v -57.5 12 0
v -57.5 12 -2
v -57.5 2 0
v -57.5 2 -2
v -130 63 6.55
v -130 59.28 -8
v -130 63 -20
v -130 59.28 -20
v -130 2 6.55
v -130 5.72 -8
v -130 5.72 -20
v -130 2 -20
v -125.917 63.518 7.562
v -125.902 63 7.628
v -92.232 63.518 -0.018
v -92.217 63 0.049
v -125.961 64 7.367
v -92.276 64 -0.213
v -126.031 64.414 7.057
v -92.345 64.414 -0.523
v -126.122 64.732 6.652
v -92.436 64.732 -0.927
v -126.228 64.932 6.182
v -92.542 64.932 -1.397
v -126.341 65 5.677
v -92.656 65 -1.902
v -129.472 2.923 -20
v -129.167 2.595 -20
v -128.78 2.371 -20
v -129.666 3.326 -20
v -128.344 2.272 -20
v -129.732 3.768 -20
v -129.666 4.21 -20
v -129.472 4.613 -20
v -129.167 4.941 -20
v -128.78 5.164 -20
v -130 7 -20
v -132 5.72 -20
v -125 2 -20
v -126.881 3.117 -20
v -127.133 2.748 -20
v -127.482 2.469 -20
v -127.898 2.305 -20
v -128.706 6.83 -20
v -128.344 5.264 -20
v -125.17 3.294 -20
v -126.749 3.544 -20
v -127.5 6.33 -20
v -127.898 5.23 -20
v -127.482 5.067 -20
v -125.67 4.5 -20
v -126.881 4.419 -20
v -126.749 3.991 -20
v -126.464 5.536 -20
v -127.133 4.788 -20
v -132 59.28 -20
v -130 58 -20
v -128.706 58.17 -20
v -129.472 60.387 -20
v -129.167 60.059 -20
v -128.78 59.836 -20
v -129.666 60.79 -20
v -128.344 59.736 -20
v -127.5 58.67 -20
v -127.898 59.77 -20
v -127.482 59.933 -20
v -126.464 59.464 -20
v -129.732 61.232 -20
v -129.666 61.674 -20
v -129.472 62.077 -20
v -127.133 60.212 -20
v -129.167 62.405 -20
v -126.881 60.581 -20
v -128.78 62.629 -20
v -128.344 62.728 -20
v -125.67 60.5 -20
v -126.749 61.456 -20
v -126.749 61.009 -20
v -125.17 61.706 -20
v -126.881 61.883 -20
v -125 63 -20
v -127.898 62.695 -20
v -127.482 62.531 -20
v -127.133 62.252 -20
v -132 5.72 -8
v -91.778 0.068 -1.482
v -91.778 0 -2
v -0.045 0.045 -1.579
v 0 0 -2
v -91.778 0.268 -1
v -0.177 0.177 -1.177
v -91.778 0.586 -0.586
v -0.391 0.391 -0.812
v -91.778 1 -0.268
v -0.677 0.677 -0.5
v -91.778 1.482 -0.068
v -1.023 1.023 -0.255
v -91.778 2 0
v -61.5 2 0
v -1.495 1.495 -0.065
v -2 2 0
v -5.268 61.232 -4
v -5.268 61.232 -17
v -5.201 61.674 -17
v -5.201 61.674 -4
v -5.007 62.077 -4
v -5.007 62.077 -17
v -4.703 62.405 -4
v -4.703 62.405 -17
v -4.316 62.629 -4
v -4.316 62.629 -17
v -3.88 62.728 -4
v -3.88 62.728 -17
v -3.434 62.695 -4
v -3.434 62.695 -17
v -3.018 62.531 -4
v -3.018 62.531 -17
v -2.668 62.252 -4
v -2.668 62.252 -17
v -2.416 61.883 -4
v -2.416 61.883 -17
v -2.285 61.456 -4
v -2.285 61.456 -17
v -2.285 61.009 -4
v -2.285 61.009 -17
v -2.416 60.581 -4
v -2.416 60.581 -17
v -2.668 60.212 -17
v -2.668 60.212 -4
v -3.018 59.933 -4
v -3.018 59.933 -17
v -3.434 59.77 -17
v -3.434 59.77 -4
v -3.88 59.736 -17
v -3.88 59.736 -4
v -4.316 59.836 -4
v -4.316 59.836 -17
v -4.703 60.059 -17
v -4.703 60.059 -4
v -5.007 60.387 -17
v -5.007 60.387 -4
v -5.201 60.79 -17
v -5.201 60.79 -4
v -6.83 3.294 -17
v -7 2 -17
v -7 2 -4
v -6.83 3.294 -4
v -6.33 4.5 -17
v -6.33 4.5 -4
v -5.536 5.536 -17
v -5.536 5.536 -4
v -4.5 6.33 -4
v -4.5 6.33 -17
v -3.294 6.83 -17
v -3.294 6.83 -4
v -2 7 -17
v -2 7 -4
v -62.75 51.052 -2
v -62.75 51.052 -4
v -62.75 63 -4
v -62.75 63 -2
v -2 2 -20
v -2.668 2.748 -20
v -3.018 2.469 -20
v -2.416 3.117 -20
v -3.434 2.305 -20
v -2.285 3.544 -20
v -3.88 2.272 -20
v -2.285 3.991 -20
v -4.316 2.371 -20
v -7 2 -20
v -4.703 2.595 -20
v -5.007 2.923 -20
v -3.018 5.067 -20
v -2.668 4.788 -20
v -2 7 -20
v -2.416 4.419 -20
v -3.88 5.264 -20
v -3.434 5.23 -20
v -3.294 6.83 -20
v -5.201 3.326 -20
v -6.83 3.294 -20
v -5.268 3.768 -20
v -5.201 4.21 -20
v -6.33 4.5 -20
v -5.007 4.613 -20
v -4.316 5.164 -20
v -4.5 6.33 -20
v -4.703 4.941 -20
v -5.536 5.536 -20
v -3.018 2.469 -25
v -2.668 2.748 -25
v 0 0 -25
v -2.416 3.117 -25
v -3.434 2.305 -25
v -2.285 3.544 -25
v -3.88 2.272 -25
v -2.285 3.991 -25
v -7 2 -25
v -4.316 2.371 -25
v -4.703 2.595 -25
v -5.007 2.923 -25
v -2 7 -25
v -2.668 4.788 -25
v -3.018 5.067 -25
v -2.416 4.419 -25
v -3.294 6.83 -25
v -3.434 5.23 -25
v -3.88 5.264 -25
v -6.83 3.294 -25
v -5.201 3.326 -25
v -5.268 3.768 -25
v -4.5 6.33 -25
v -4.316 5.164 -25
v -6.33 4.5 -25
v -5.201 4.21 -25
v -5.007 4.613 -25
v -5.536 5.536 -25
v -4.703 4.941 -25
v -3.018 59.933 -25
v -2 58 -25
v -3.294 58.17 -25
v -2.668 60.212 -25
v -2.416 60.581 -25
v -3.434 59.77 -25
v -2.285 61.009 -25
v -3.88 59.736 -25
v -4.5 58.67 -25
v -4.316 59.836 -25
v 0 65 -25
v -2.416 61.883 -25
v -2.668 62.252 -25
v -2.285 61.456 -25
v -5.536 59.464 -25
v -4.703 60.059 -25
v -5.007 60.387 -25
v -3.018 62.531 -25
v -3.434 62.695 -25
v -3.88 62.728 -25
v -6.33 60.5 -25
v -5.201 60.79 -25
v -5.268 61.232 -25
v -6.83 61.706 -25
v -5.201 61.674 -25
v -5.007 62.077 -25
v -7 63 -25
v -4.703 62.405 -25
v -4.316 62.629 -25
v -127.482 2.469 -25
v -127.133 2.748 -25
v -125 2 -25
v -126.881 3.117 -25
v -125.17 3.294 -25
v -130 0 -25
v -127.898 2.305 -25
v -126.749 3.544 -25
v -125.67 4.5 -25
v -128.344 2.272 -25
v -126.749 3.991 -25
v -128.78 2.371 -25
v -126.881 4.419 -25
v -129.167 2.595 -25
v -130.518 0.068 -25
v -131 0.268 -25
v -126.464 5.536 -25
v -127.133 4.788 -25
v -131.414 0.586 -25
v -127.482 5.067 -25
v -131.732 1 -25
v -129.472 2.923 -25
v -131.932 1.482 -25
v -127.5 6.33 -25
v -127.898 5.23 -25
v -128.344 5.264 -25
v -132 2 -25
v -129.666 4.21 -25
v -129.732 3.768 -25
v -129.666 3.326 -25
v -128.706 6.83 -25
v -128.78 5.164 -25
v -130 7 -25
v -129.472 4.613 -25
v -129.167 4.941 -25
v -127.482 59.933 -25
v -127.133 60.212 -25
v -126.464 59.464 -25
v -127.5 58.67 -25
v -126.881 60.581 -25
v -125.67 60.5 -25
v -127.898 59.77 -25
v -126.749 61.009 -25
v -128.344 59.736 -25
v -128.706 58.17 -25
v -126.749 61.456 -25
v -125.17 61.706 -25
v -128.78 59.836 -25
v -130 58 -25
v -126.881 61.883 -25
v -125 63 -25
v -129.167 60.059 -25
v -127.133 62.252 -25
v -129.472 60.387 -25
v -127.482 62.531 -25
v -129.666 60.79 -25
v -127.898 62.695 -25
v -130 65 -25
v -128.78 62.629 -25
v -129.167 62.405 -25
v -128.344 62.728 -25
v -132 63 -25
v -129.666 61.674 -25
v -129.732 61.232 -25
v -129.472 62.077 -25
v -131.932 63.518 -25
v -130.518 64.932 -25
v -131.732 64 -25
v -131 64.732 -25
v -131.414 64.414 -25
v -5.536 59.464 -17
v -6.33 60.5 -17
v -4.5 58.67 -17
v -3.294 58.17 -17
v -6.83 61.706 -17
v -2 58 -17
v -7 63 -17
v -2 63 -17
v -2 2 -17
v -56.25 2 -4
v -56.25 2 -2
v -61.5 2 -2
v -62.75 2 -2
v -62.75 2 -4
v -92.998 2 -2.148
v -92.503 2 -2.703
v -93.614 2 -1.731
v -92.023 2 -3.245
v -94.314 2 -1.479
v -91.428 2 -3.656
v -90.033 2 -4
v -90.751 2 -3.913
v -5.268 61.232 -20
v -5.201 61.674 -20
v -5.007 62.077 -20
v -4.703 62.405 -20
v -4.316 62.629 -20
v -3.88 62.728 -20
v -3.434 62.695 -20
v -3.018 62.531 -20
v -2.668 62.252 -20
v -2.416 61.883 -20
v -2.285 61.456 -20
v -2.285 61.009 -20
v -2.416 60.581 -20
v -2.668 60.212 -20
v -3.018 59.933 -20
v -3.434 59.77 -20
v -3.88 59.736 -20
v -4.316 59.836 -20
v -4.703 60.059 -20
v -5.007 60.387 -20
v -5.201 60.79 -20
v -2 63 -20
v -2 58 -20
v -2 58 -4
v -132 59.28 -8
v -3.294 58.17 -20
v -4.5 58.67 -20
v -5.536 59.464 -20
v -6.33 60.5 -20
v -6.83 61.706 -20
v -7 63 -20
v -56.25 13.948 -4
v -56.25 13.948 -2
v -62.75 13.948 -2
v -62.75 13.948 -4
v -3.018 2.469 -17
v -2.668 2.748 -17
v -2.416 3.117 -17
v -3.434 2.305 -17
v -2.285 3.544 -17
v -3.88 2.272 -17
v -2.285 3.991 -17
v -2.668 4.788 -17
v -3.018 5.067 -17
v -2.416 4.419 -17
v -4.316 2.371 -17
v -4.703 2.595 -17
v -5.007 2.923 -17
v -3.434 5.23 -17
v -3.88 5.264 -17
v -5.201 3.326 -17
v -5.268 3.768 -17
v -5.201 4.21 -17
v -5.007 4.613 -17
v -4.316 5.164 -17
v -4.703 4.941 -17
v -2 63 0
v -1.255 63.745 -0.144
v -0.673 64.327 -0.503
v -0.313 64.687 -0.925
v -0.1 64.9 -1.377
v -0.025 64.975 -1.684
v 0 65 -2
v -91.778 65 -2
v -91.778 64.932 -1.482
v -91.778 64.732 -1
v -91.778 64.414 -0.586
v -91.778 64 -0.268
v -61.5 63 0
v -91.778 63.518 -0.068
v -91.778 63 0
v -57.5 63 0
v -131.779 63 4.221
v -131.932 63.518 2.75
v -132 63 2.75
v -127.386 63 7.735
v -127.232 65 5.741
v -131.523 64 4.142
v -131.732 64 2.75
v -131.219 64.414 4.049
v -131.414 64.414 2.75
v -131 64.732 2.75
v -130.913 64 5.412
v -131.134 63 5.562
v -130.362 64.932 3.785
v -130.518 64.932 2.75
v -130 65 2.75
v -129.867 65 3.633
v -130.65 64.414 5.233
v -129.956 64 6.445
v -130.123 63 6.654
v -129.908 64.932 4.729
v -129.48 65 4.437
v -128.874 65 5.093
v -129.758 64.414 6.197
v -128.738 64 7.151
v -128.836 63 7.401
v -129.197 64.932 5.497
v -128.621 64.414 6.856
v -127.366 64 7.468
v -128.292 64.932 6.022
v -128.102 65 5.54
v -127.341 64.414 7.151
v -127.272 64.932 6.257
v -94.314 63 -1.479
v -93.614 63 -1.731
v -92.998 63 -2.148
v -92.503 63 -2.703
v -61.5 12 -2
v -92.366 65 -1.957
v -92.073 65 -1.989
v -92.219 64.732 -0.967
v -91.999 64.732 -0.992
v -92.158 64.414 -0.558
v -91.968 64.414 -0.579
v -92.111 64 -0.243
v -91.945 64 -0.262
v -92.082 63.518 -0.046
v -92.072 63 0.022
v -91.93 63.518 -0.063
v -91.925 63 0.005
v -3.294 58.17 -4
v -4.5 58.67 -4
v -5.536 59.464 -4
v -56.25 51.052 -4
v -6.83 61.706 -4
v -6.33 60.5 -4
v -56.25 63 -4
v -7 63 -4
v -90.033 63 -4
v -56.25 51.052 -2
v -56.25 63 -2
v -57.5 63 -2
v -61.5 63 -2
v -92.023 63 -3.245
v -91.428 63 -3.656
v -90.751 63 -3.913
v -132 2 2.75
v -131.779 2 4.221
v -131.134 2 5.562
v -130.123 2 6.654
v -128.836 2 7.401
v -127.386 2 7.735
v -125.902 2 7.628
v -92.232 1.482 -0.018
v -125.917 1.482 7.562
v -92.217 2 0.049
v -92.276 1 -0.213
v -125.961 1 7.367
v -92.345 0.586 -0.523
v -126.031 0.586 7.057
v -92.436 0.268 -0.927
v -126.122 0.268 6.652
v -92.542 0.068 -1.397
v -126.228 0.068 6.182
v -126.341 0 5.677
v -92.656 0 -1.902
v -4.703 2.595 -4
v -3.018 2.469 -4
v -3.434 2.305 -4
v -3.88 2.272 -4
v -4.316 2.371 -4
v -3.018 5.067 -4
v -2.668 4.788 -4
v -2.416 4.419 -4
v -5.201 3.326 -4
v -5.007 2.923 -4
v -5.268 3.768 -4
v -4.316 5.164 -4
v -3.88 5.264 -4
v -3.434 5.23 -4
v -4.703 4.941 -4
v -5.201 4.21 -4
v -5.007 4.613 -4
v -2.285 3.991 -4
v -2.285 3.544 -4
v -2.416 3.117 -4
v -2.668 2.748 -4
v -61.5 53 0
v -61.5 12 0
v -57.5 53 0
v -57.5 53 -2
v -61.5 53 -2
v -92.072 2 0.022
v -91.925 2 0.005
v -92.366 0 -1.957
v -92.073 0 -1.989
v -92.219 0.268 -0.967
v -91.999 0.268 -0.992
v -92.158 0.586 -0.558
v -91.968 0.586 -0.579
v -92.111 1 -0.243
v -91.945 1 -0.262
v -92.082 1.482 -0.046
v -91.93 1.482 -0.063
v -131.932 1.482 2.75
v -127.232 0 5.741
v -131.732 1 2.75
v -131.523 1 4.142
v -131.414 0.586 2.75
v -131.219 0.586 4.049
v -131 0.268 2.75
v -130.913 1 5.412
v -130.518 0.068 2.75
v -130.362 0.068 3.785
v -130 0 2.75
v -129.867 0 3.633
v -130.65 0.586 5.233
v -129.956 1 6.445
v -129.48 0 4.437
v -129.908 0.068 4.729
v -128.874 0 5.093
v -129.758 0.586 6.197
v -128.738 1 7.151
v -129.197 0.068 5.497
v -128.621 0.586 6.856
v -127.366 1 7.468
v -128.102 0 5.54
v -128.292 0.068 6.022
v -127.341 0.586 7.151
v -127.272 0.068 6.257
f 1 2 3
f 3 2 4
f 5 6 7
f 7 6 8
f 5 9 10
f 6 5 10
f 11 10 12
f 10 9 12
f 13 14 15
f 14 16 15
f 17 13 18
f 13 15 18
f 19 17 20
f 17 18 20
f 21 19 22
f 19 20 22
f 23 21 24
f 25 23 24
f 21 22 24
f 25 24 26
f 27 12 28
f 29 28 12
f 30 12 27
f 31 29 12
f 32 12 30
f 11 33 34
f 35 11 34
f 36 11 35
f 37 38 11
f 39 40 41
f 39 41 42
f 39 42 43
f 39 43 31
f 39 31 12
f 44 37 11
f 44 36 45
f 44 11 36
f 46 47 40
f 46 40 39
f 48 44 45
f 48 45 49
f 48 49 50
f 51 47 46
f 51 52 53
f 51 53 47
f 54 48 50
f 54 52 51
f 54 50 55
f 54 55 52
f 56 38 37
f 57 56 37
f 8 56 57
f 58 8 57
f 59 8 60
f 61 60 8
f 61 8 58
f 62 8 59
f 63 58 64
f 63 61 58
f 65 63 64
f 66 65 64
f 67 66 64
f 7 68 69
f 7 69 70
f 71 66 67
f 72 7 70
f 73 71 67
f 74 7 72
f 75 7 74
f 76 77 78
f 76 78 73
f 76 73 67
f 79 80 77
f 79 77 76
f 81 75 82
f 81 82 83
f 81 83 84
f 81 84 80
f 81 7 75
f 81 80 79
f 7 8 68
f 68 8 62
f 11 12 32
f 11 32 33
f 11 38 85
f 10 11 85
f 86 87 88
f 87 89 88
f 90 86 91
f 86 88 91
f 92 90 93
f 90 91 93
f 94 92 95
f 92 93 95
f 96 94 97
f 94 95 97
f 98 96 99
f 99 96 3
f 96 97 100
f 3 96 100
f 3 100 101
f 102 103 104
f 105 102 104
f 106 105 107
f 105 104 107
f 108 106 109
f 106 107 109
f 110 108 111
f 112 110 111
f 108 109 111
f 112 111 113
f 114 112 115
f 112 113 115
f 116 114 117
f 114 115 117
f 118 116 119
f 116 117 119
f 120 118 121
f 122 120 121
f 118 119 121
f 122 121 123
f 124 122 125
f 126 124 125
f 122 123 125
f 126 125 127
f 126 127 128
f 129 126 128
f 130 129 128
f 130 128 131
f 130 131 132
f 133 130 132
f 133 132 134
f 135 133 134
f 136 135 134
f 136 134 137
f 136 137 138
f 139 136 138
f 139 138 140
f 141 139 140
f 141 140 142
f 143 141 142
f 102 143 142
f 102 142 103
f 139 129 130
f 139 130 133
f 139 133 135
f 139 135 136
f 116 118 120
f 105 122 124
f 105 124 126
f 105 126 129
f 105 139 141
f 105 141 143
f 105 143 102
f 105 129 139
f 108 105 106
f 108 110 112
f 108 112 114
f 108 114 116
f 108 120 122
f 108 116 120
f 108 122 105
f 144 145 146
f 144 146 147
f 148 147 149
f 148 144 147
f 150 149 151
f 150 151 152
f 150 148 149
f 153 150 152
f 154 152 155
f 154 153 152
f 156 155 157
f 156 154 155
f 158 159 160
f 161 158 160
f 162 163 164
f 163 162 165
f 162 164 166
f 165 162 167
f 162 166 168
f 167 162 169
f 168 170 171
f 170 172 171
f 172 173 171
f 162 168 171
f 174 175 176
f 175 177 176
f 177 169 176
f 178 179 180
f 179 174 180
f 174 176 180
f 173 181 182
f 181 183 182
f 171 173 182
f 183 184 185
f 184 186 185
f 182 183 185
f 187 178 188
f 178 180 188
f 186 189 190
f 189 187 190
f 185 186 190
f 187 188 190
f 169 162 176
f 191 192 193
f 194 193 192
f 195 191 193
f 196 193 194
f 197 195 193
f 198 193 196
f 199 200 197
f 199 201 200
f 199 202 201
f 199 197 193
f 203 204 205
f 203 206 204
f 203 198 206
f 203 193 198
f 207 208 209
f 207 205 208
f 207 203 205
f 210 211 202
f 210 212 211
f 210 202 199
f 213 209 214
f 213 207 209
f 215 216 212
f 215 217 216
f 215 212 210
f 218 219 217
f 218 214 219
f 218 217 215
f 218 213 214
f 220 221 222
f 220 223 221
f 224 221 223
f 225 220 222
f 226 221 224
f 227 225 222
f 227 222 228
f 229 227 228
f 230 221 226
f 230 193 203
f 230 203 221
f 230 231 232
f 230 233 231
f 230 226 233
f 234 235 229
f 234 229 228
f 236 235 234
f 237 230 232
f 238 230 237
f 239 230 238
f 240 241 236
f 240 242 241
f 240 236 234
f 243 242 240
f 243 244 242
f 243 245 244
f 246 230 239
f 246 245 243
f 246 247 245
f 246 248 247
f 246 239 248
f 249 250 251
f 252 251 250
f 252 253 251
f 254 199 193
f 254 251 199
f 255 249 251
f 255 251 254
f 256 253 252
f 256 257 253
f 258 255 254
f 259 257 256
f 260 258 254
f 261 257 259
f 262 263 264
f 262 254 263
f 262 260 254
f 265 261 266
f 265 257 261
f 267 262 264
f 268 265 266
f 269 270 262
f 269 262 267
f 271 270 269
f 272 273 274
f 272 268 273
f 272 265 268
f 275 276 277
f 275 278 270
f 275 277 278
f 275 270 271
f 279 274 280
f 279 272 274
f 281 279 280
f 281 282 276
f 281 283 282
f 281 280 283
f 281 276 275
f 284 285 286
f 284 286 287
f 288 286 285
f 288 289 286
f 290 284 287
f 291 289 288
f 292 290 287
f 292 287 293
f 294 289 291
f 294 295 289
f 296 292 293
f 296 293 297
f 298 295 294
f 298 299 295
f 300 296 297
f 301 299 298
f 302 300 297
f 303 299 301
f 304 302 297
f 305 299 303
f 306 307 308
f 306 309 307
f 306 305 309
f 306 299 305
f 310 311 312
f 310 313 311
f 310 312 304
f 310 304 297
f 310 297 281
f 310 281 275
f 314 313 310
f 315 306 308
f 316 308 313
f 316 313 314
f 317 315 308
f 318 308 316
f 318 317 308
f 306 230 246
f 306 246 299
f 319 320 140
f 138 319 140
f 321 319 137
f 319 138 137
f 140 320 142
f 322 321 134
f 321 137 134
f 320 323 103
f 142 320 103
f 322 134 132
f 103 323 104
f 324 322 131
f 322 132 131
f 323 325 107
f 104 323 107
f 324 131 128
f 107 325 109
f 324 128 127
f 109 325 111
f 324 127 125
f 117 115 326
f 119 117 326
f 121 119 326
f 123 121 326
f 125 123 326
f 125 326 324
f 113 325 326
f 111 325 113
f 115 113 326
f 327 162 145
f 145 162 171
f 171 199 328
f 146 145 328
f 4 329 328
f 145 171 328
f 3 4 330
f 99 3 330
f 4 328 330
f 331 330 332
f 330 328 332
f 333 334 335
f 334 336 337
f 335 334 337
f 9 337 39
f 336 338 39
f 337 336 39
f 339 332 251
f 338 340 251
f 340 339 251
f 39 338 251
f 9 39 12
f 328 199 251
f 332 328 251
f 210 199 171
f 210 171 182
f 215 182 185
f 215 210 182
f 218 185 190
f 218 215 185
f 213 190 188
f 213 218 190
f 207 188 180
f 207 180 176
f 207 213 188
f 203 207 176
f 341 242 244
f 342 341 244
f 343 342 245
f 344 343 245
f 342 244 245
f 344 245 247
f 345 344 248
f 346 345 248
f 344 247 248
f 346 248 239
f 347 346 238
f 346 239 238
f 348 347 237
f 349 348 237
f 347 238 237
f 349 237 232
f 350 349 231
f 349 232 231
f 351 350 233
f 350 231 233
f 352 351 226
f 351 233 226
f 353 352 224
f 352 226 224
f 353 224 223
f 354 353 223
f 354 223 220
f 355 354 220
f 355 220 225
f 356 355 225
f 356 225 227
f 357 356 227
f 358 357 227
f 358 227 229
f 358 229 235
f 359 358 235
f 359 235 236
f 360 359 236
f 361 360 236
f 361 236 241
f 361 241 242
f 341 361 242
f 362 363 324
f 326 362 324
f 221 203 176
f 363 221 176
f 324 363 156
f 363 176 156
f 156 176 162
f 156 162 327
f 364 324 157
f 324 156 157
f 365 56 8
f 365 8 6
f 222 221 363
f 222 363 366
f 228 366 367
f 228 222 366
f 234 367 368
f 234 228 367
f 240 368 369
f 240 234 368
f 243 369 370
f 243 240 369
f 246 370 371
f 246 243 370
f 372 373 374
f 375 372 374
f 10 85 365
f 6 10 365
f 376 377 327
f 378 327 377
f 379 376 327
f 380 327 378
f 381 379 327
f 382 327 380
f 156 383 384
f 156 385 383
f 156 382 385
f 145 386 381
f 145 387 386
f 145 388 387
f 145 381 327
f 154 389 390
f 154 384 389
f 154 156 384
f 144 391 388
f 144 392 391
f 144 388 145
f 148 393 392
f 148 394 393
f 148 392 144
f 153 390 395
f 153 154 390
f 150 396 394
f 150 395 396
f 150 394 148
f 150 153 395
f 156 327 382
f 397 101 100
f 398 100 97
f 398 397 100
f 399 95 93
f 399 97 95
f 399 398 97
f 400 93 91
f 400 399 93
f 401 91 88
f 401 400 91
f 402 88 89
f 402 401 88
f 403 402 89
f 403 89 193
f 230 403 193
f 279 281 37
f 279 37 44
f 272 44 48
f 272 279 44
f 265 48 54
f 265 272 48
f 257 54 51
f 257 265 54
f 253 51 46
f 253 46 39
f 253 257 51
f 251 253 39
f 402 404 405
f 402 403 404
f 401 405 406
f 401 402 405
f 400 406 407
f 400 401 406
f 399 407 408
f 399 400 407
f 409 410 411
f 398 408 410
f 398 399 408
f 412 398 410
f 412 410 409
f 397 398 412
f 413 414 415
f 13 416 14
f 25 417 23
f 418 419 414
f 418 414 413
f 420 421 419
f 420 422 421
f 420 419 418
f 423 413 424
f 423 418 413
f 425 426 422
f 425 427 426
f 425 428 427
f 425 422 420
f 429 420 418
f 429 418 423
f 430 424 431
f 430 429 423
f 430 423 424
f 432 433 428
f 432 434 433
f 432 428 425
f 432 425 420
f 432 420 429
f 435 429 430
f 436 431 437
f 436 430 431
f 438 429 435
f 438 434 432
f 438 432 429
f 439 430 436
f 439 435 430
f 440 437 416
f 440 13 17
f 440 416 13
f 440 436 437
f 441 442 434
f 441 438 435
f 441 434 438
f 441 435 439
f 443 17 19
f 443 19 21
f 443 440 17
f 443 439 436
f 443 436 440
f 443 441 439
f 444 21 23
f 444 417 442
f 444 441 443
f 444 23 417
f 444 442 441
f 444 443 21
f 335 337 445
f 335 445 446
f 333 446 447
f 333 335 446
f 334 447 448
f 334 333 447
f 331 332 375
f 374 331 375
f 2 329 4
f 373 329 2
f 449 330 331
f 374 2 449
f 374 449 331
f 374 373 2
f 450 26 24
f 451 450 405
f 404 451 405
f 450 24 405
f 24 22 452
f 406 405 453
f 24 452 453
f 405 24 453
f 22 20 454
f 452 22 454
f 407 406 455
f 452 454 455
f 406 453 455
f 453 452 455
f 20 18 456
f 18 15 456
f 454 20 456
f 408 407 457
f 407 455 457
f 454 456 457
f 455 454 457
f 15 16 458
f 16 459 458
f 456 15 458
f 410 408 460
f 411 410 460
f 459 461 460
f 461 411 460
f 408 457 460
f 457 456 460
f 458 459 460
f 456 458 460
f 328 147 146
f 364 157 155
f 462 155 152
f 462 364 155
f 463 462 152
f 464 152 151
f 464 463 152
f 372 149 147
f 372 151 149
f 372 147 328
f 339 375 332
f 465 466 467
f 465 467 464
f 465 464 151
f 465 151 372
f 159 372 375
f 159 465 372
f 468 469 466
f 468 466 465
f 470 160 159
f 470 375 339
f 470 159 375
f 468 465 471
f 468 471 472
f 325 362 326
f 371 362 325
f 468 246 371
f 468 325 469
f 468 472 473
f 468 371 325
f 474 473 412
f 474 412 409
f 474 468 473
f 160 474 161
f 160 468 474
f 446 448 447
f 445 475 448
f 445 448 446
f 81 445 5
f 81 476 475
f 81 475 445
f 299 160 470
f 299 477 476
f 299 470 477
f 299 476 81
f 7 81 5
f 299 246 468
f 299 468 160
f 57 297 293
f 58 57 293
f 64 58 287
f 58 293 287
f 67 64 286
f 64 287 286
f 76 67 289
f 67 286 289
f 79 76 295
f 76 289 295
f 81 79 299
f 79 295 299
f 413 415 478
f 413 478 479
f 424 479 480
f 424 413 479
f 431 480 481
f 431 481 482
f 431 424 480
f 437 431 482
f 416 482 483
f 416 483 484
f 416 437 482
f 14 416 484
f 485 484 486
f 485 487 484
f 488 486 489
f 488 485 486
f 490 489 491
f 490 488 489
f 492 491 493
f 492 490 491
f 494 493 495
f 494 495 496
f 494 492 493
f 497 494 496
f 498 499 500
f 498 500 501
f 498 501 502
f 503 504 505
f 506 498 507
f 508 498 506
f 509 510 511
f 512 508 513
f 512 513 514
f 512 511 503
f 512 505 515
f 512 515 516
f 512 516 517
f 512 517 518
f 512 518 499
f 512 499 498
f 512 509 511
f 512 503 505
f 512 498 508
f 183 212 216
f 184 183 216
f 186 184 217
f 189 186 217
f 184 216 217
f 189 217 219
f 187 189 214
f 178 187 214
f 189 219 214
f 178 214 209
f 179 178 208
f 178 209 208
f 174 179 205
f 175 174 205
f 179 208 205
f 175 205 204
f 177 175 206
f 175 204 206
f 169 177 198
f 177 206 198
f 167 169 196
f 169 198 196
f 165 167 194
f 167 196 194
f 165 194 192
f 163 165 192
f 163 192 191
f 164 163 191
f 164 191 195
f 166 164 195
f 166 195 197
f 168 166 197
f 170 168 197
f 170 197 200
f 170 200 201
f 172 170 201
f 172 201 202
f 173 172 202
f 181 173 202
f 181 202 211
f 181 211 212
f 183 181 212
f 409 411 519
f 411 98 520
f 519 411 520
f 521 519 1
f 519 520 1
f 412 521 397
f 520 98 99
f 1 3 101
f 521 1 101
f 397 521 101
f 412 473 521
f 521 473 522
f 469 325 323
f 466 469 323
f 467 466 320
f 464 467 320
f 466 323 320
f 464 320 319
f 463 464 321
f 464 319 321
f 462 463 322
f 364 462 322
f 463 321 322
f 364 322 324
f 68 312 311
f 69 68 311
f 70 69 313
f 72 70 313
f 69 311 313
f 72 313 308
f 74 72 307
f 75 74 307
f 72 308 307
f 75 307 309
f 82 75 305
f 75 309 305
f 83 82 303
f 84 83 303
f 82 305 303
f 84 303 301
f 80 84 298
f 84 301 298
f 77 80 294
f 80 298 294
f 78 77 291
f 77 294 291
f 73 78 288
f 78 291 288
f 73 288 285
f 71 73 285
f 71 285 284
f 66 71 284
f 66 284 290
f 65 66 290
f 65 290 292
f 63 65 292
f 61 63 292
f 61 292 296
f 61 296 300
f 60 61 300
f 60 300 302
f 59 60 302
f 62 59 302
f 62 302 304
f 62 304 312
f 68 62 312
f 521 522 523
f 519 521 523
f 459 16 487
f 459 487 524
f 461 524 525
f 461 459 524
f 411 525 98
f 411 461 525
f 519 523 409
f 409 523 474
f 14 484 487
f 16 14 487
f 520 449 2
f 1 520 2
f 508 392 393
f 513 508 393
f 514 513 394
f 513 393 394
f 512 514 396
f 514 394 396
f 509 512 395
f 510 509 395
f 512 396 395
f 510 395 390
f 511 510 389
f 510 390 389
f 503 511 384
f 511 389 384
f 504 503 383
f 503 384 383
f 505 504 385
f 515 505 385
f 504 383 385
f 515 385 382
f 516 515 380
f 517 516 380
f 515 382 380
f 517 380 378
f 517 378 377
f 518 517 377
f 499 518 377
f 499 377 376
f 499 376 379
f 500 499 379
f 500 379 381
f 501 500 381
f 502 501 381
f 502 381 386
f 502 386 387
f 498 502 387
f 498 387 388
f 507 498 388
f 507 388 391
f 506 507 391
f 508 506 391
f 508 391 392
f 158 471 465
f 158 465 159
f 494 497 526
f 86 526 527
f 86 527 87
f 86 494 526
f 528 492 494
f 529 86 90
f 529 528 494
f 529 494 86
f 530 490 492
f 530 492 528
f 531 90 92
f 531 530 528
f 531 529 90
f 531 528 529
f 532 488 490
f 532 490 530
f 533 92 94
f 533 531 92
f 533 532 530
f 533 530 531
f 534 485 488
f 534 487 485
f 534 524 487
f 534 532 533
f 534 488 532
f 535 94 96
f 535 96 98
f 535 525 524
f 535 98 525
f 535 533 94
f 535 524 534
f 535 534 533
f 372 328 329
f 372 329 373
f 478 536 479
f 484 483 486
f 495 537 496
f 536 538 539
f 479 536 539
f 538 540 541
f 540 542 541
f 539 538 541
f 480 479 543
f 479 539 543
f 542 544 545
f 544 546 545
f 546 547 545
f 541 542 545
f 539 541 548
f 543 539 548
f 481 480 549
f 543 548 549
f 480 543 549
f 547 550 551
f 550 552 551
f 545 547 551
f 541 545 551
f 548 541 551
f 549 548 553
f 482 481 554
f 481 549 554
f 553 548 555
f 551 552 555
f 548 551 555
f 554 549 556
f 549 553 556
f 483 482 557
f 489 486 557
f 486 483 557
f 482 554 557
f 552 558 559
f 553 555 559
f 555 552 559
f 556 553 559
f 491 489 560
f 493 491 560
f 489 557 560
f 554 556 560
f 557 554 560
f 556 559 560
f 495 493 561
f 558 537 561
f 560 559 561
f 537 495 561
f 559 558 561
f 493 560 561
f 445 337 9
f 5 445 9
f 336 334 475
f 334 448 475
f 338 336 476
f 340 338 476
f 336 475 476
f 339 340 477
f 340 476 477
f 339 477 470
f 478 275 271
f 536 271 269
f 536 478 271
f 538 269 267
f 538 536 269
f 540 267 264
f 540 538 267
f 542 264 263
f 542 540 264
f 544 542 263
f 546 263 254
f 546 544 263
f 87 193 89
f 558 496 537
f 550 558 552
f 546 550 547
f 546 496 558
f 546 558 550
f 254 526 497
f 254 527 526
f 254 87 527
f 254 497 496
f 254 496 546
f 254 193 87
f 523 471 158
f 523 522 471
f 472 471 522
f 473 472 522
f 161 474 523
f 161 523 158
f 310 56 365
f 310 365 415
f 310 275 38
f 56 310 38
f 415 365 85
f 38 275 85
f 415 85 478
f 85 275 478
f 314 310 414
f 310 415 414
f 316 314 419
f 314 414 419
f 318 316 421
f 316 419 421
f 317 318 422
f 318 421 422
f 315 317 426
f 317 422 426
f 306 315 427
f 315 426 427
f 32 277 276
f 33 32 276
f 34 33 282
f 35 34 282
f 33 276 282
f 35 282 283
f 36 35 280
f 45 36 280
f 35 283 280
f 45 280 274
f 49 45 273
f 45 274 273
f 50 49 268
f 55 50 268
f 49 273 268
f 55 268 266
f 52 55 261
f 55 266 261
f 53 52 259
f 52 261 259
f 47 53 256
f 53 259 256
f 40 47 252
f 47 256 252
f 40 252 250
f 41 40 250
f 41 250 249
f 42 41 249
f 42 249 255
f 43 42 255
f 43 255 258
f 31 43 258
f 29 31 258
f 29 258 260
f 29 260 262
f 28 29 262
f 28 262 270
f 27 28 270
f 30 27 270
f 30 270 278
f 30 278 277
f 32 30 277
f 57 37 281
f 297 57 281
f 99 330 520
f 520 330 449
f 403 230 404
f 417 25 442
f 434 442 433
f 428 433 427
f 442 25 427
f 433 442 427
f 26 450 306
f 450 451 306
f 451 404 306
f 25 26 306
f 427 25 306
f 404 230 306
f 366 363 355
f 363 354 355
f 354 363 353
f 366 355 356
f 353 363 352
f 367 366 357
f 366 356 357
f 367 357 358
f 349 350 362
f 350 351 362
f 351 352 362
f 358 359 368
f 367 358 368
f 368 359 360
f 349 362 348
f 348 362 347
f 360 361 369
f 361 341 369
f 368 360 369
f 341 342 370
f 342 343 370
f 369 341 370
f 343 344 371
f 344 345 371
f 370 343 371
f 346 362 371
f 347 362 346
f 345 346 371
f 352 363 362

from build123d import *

# Parameters (mm, degrees)
BOSS_EXTRUDE3_DEPTH = 65
BOSS_EXTRUDE4_REACH = 153.013
SKETCH4_W           = 128
SKETCH4_H           = 2
SKETCH5_W           = 12
SKETCH5_H           = 53.559358602
CUT_EXTRUDE2_DEPTH  = 11
FILLET1_R           = 5
FILLET2_R           = 2
SKETCH7_W           = 90
SKETCH7_H           = 61
BOSS_EXTRUDE5_DEPTH = 2
BOSS_EXTRUDE6_DEPTH = 5
SKETCH12_R          = 1.5
CUT_EXTRUDE5_DEPTH  = 20
BOSS_EXTRUDE7_START = 13
BOSS_EXTRUDE7_DEPTH = 13
SKETCH15_R          = 1.5
CUT_EXTRUDE6_DEPTH  = 21
SKETCH16_W          = 6.5
SKETCH16_H          = 61
CUT_EXTRUDE7_DEPTH  = 2
FILLET3_R           = 3
FILLET4_R           = 3
CUT_EXTRUDE9_DEPTH  = 2
SKETCH18_W          = 6.5
SKETCH18_H          = 37.103743482
BOSS_EXTRUDE8_DEPTH = 2


with BuildPart() as part:
    # Sketch3 → Boss-Extrude3 (new body)
    with BuildSketch(Plane(origin=(0, 0, 0), x_dir=(1, 0, 0), z_dir=(0, 1, 0))):
        Polygon((0, 0), (0, 25), (-2, 25), (-2, 2), (-92, 2), (-130, -6.55), (-130, 25), (-132, 25), (-132, -9), (-92, 0), align=None)
    extrude(amount=BOSS_EXTRUDE3_DEPTH)

    # Sketch4 → Boss-Extrude4 (add, up to next)
    with BuildSketch(Plane(origin=(0, 0, -25), x_dir=(-1, 0, 0), z_dir=(0, 0, -1)), mode=Mode.PRIVATE) as boss_extrude4_sk1:
        with Locations((66, 64)):
            Rectangle(SKETCH4_W, SKETCH4_H)
    boss_extrude4_tool1 = extrude(boss_extrude4_sk1.sketch, amount=-BOSS_EXTRUDE4_REACH, mode=Mode.PRIVATE) - part.part
    # Sketch4 → Boss-Extrude4 (add, up to next)
    with BuildSketch(Plane(origin=(0, 0, -25), x_dir=(-1, 0, 0), z_dir=(0, 0, -1)), mode=Mode.PRIVATE) as boss_extrude4_sk2:
        with Locations((66, 1)):
            Rectangle(SKETCH4_W, SKETCH4_H)
    boss_extrude4_tool2 = extrude(boss_extrude4_sk2.sketch, amount=-BOSS_EXTRUDE4_REACH, mode=Mode.PRIVATE) - part.part
    add(boss_extrude4_tool1.solids().sort_by_distance((-66, 64, -25))[0])
    add(boss_extrude4_tool2.solids().sort_by_distance((-66, 1, -25))[0])

    # Sketch5 → Cut-Extrude2 (cut)
    with BuildSketch(Plane.ZY.offset(132)):
        with Locations((-14, 32.5)):
            Rectangle(SKETCH5_W, SKETCH5_H)
    extrude(amount=-CUT_EXTRUDE2_DEPTH, mode=Mode.SUBTRACT)

    # Fillet1
    fillet1_edges = [part.edges().sort_by_distance(p)[0] for p in [
        (-132, 32.5, 9),
    ]]
    fillet(fillet1_edges, radius=FILLET1_R)

    # Fillet2
    fillet2_edges = [part.edges().sort_by_distance(p)[0] for p in [
        (-132, 0, -11.125),
        (-46, 0, 0),
        (-92, 32.5, 0),
        (0, 32.5, 0),
        (-132, 65, -11.125),
        (-46, 65, 0),
        (-108.951219512, 0, 3.81402439),
        (-108.951219512, 65, 3.81402439),
        (-130.123475238, 0, 6.654344047),
        (-130.123475238, 65, 6.654344047),
    ]]
    fillet(fillet2_edges, radius=FILLET2_R)

    # Sketch7 → Boss-Extrude5 (add)
    with BuildSketch(Plane(origin=(0, 0, -2), x_dir=(-1, 0, 0), z_dir=(0, 0, -1))):
        with Locations((47, 32.5)):
            Rectangle(SKETCH7_W, SKETCH7_H)
    extrude(amount=BOSS_EXTRUDE5_DEPTH)

    # Sketch11 → Boss-Extrude6 (add)
    with BuildSketch(Plane(origin=(0, 0, -25), x_dir=(-1, 0, 0), z_dir=(0, 0, -1))):
        with BuildLine():
            Line((7, 63), (2, 63))
            Line((2, 63), (2, 58))
            ThreePointArc((2, 58), (5.535533906, 59.464466094), (7, 63))
        make_face()
        with BuildLine():
            Line((2, 7), (2, 2))
            Line((2, 2), (7, 2))
            ThreePointArc((7, 2), (5.535533906, 5.535533906), (2, 7))
        make_face()
        with BuildLine():
            Line((125, 2), (130, 2))
            Line((130, 2), (130, 7))
            ThreePointArc((130, 7), (126.464466094, 5.535533906), (125, 2))
        make_face()
        with BuildLine():
            Line((125, 63), (130, 63))
            Line((130, 63), (130, 58))
            ThreePointArc((130, 58), (126.464466094, 59.464466094), (125, 63))
        make_face()
    extrude(amount=-BOSS_EXTRUDE6_DEPTH)

    # Sketch12 → Cut-Extrude5 (cut)
    with BuildSketch(Plane(origin=(0, 0, -25), x_dir=(-1, 0, 0), z_dir=(0, 0, -1))):
        with Locations((3.767766953, 61.232233047)):
            Circle(SKETCH12_R)
        with Locations((128.232233047, 61.232233047)):
            Circle(SKETCH12_R)
        with Locations((128.232233047, 3.767766953)):
            Circle(SKETCH12_R)
        with Locations((3.767766953, 3.767766953)):
            Circle(SKETCH12_R)
    extrude(amount=-CUT_EXTRUDE5_DEPTH, mode=Mode.SUBTRACT)

    # Sketch14 → Boss-Extrude7 (add)
    with BuildSketch(Plane(origin=(0, 0, -4), x_dir=(-1, 0, 0), z_dir=(0, 0, -1)).offset(BOSS_EXTRUDE7_START)):
        with BuildLine():
            Line((2, 58), (2, 63))
            Line((2, 63), (7, 63))
            ThreePointArc((7, 63), (5.535533906, 59.464466094), (2, 58))
        make_face()
        with BuildLine():
            Line((2, 2), (7, 2))
            ThreePointArc((7, 2), (5.535533906, 5.535533906), (2, 7))
            Line((2, 7), (2, 2))
        make_face()
    extrude(amount=-BOSS_EXTRUDE7_DEPTH)

    # Sketch15 → Cut-Extrude6 (cut)
    with BuildSketch(Plane(origin=(0, 0, -25), x_dir=(-1, 0, 0), z_dir=(0, 0, -1))):
        with Locations((3.767766953, 3.767766953)):
            Circle(SKETCH15_R)
        with Locations((3.767766953, 61.232233047)):
            Circle(SKETCH15_R)
    extrude(amount=-CUT_EXTRUDE6_DEPTH, mode=Mode.SUBTRACT)

    # Sketch16 → Cut-Extrude7 (cut)
    with BuildSketch(Plane(origin=(0, 0, -4), x_dir=(-1, 0, 0), z_dir=(0, 0, -1))):
        with Locations((59.5, 32.5)):
            Rectangle(SKETCH16_W, SKETCH16_H)
    extrude(amount=-CUT_EXTRUDE7_DEPTH, mode=Mode.SUBTRACT)

    # Fillet3
    # the kernel refuses this fillet: 3 mm, written as the material it adds along each edge
    with BuildSketch(Plane(origin=(-92, 2, -2), x_dir=(-2.9487523534032267e-12, 0, -1.0), z_dir=(0, 1, 0))) as fillet3_piece_1:
        with BuildLine():
            CenterArc((2.406216573, 2.972370787), FILLET3_R, 192.680383492, 69.537546468)
            Line((-0.520612695, 2.313834202), (-0.579149281, 2.30066347))
            Line((-0.579149281, 2.30066347), (-0.058536585, -0.013170732))
            Line((-0.058536585, -0.013170732), (0, -0.06))
            ThreePointArc((0, -0.06), (1, -0.06), (1.991875669, -0.059447416))
            Line((1.991875669, -0.059447416), (2, 0))
        make_face()
    extrude(amount=61)

    # Fillet4
    fillet4_edges = [part.edges().sort_by_distance(p)[0] for p in [
        (-92, 32.5, -4),
    ]]
    fillet(fillet4_edges, radius=FILLET4_R)

    # Sketch17 → Cut-Extrude9 (cut)
    with BuildSketch(Plane(origin=(0, 0, -2), x_dir=(-1, 0, 0), z_dir=(0, 0, -1))):
        Polygon((59.5, 53), (61.5, 53), (61.5, 63), (57.5, 63), (57.5, 53), align=None)
        Polygon((57.5, 2), (61.5, 2), (61.5, 12), (59.5, 12), (57.5, 12), align=None)
    extrude(amount=-CUT_EXTRUDE9_DEPTH, mode=Mode.SUBTRACT)

    # Sketch18 → Boss-Extrude8 (add)
    with BuildSketch(Plane(origin=(0, 0, -2), x_dir=(-1, 0, 0), z_dir=(0, 0, -1))):
        with Locations((59.5, 32.5)):
            Rectangle(SKETCH18_W, SKETCH18_H)
    extrude(amount=BOSS_EXTRUDE8_DEPTH)


solid = part.part
